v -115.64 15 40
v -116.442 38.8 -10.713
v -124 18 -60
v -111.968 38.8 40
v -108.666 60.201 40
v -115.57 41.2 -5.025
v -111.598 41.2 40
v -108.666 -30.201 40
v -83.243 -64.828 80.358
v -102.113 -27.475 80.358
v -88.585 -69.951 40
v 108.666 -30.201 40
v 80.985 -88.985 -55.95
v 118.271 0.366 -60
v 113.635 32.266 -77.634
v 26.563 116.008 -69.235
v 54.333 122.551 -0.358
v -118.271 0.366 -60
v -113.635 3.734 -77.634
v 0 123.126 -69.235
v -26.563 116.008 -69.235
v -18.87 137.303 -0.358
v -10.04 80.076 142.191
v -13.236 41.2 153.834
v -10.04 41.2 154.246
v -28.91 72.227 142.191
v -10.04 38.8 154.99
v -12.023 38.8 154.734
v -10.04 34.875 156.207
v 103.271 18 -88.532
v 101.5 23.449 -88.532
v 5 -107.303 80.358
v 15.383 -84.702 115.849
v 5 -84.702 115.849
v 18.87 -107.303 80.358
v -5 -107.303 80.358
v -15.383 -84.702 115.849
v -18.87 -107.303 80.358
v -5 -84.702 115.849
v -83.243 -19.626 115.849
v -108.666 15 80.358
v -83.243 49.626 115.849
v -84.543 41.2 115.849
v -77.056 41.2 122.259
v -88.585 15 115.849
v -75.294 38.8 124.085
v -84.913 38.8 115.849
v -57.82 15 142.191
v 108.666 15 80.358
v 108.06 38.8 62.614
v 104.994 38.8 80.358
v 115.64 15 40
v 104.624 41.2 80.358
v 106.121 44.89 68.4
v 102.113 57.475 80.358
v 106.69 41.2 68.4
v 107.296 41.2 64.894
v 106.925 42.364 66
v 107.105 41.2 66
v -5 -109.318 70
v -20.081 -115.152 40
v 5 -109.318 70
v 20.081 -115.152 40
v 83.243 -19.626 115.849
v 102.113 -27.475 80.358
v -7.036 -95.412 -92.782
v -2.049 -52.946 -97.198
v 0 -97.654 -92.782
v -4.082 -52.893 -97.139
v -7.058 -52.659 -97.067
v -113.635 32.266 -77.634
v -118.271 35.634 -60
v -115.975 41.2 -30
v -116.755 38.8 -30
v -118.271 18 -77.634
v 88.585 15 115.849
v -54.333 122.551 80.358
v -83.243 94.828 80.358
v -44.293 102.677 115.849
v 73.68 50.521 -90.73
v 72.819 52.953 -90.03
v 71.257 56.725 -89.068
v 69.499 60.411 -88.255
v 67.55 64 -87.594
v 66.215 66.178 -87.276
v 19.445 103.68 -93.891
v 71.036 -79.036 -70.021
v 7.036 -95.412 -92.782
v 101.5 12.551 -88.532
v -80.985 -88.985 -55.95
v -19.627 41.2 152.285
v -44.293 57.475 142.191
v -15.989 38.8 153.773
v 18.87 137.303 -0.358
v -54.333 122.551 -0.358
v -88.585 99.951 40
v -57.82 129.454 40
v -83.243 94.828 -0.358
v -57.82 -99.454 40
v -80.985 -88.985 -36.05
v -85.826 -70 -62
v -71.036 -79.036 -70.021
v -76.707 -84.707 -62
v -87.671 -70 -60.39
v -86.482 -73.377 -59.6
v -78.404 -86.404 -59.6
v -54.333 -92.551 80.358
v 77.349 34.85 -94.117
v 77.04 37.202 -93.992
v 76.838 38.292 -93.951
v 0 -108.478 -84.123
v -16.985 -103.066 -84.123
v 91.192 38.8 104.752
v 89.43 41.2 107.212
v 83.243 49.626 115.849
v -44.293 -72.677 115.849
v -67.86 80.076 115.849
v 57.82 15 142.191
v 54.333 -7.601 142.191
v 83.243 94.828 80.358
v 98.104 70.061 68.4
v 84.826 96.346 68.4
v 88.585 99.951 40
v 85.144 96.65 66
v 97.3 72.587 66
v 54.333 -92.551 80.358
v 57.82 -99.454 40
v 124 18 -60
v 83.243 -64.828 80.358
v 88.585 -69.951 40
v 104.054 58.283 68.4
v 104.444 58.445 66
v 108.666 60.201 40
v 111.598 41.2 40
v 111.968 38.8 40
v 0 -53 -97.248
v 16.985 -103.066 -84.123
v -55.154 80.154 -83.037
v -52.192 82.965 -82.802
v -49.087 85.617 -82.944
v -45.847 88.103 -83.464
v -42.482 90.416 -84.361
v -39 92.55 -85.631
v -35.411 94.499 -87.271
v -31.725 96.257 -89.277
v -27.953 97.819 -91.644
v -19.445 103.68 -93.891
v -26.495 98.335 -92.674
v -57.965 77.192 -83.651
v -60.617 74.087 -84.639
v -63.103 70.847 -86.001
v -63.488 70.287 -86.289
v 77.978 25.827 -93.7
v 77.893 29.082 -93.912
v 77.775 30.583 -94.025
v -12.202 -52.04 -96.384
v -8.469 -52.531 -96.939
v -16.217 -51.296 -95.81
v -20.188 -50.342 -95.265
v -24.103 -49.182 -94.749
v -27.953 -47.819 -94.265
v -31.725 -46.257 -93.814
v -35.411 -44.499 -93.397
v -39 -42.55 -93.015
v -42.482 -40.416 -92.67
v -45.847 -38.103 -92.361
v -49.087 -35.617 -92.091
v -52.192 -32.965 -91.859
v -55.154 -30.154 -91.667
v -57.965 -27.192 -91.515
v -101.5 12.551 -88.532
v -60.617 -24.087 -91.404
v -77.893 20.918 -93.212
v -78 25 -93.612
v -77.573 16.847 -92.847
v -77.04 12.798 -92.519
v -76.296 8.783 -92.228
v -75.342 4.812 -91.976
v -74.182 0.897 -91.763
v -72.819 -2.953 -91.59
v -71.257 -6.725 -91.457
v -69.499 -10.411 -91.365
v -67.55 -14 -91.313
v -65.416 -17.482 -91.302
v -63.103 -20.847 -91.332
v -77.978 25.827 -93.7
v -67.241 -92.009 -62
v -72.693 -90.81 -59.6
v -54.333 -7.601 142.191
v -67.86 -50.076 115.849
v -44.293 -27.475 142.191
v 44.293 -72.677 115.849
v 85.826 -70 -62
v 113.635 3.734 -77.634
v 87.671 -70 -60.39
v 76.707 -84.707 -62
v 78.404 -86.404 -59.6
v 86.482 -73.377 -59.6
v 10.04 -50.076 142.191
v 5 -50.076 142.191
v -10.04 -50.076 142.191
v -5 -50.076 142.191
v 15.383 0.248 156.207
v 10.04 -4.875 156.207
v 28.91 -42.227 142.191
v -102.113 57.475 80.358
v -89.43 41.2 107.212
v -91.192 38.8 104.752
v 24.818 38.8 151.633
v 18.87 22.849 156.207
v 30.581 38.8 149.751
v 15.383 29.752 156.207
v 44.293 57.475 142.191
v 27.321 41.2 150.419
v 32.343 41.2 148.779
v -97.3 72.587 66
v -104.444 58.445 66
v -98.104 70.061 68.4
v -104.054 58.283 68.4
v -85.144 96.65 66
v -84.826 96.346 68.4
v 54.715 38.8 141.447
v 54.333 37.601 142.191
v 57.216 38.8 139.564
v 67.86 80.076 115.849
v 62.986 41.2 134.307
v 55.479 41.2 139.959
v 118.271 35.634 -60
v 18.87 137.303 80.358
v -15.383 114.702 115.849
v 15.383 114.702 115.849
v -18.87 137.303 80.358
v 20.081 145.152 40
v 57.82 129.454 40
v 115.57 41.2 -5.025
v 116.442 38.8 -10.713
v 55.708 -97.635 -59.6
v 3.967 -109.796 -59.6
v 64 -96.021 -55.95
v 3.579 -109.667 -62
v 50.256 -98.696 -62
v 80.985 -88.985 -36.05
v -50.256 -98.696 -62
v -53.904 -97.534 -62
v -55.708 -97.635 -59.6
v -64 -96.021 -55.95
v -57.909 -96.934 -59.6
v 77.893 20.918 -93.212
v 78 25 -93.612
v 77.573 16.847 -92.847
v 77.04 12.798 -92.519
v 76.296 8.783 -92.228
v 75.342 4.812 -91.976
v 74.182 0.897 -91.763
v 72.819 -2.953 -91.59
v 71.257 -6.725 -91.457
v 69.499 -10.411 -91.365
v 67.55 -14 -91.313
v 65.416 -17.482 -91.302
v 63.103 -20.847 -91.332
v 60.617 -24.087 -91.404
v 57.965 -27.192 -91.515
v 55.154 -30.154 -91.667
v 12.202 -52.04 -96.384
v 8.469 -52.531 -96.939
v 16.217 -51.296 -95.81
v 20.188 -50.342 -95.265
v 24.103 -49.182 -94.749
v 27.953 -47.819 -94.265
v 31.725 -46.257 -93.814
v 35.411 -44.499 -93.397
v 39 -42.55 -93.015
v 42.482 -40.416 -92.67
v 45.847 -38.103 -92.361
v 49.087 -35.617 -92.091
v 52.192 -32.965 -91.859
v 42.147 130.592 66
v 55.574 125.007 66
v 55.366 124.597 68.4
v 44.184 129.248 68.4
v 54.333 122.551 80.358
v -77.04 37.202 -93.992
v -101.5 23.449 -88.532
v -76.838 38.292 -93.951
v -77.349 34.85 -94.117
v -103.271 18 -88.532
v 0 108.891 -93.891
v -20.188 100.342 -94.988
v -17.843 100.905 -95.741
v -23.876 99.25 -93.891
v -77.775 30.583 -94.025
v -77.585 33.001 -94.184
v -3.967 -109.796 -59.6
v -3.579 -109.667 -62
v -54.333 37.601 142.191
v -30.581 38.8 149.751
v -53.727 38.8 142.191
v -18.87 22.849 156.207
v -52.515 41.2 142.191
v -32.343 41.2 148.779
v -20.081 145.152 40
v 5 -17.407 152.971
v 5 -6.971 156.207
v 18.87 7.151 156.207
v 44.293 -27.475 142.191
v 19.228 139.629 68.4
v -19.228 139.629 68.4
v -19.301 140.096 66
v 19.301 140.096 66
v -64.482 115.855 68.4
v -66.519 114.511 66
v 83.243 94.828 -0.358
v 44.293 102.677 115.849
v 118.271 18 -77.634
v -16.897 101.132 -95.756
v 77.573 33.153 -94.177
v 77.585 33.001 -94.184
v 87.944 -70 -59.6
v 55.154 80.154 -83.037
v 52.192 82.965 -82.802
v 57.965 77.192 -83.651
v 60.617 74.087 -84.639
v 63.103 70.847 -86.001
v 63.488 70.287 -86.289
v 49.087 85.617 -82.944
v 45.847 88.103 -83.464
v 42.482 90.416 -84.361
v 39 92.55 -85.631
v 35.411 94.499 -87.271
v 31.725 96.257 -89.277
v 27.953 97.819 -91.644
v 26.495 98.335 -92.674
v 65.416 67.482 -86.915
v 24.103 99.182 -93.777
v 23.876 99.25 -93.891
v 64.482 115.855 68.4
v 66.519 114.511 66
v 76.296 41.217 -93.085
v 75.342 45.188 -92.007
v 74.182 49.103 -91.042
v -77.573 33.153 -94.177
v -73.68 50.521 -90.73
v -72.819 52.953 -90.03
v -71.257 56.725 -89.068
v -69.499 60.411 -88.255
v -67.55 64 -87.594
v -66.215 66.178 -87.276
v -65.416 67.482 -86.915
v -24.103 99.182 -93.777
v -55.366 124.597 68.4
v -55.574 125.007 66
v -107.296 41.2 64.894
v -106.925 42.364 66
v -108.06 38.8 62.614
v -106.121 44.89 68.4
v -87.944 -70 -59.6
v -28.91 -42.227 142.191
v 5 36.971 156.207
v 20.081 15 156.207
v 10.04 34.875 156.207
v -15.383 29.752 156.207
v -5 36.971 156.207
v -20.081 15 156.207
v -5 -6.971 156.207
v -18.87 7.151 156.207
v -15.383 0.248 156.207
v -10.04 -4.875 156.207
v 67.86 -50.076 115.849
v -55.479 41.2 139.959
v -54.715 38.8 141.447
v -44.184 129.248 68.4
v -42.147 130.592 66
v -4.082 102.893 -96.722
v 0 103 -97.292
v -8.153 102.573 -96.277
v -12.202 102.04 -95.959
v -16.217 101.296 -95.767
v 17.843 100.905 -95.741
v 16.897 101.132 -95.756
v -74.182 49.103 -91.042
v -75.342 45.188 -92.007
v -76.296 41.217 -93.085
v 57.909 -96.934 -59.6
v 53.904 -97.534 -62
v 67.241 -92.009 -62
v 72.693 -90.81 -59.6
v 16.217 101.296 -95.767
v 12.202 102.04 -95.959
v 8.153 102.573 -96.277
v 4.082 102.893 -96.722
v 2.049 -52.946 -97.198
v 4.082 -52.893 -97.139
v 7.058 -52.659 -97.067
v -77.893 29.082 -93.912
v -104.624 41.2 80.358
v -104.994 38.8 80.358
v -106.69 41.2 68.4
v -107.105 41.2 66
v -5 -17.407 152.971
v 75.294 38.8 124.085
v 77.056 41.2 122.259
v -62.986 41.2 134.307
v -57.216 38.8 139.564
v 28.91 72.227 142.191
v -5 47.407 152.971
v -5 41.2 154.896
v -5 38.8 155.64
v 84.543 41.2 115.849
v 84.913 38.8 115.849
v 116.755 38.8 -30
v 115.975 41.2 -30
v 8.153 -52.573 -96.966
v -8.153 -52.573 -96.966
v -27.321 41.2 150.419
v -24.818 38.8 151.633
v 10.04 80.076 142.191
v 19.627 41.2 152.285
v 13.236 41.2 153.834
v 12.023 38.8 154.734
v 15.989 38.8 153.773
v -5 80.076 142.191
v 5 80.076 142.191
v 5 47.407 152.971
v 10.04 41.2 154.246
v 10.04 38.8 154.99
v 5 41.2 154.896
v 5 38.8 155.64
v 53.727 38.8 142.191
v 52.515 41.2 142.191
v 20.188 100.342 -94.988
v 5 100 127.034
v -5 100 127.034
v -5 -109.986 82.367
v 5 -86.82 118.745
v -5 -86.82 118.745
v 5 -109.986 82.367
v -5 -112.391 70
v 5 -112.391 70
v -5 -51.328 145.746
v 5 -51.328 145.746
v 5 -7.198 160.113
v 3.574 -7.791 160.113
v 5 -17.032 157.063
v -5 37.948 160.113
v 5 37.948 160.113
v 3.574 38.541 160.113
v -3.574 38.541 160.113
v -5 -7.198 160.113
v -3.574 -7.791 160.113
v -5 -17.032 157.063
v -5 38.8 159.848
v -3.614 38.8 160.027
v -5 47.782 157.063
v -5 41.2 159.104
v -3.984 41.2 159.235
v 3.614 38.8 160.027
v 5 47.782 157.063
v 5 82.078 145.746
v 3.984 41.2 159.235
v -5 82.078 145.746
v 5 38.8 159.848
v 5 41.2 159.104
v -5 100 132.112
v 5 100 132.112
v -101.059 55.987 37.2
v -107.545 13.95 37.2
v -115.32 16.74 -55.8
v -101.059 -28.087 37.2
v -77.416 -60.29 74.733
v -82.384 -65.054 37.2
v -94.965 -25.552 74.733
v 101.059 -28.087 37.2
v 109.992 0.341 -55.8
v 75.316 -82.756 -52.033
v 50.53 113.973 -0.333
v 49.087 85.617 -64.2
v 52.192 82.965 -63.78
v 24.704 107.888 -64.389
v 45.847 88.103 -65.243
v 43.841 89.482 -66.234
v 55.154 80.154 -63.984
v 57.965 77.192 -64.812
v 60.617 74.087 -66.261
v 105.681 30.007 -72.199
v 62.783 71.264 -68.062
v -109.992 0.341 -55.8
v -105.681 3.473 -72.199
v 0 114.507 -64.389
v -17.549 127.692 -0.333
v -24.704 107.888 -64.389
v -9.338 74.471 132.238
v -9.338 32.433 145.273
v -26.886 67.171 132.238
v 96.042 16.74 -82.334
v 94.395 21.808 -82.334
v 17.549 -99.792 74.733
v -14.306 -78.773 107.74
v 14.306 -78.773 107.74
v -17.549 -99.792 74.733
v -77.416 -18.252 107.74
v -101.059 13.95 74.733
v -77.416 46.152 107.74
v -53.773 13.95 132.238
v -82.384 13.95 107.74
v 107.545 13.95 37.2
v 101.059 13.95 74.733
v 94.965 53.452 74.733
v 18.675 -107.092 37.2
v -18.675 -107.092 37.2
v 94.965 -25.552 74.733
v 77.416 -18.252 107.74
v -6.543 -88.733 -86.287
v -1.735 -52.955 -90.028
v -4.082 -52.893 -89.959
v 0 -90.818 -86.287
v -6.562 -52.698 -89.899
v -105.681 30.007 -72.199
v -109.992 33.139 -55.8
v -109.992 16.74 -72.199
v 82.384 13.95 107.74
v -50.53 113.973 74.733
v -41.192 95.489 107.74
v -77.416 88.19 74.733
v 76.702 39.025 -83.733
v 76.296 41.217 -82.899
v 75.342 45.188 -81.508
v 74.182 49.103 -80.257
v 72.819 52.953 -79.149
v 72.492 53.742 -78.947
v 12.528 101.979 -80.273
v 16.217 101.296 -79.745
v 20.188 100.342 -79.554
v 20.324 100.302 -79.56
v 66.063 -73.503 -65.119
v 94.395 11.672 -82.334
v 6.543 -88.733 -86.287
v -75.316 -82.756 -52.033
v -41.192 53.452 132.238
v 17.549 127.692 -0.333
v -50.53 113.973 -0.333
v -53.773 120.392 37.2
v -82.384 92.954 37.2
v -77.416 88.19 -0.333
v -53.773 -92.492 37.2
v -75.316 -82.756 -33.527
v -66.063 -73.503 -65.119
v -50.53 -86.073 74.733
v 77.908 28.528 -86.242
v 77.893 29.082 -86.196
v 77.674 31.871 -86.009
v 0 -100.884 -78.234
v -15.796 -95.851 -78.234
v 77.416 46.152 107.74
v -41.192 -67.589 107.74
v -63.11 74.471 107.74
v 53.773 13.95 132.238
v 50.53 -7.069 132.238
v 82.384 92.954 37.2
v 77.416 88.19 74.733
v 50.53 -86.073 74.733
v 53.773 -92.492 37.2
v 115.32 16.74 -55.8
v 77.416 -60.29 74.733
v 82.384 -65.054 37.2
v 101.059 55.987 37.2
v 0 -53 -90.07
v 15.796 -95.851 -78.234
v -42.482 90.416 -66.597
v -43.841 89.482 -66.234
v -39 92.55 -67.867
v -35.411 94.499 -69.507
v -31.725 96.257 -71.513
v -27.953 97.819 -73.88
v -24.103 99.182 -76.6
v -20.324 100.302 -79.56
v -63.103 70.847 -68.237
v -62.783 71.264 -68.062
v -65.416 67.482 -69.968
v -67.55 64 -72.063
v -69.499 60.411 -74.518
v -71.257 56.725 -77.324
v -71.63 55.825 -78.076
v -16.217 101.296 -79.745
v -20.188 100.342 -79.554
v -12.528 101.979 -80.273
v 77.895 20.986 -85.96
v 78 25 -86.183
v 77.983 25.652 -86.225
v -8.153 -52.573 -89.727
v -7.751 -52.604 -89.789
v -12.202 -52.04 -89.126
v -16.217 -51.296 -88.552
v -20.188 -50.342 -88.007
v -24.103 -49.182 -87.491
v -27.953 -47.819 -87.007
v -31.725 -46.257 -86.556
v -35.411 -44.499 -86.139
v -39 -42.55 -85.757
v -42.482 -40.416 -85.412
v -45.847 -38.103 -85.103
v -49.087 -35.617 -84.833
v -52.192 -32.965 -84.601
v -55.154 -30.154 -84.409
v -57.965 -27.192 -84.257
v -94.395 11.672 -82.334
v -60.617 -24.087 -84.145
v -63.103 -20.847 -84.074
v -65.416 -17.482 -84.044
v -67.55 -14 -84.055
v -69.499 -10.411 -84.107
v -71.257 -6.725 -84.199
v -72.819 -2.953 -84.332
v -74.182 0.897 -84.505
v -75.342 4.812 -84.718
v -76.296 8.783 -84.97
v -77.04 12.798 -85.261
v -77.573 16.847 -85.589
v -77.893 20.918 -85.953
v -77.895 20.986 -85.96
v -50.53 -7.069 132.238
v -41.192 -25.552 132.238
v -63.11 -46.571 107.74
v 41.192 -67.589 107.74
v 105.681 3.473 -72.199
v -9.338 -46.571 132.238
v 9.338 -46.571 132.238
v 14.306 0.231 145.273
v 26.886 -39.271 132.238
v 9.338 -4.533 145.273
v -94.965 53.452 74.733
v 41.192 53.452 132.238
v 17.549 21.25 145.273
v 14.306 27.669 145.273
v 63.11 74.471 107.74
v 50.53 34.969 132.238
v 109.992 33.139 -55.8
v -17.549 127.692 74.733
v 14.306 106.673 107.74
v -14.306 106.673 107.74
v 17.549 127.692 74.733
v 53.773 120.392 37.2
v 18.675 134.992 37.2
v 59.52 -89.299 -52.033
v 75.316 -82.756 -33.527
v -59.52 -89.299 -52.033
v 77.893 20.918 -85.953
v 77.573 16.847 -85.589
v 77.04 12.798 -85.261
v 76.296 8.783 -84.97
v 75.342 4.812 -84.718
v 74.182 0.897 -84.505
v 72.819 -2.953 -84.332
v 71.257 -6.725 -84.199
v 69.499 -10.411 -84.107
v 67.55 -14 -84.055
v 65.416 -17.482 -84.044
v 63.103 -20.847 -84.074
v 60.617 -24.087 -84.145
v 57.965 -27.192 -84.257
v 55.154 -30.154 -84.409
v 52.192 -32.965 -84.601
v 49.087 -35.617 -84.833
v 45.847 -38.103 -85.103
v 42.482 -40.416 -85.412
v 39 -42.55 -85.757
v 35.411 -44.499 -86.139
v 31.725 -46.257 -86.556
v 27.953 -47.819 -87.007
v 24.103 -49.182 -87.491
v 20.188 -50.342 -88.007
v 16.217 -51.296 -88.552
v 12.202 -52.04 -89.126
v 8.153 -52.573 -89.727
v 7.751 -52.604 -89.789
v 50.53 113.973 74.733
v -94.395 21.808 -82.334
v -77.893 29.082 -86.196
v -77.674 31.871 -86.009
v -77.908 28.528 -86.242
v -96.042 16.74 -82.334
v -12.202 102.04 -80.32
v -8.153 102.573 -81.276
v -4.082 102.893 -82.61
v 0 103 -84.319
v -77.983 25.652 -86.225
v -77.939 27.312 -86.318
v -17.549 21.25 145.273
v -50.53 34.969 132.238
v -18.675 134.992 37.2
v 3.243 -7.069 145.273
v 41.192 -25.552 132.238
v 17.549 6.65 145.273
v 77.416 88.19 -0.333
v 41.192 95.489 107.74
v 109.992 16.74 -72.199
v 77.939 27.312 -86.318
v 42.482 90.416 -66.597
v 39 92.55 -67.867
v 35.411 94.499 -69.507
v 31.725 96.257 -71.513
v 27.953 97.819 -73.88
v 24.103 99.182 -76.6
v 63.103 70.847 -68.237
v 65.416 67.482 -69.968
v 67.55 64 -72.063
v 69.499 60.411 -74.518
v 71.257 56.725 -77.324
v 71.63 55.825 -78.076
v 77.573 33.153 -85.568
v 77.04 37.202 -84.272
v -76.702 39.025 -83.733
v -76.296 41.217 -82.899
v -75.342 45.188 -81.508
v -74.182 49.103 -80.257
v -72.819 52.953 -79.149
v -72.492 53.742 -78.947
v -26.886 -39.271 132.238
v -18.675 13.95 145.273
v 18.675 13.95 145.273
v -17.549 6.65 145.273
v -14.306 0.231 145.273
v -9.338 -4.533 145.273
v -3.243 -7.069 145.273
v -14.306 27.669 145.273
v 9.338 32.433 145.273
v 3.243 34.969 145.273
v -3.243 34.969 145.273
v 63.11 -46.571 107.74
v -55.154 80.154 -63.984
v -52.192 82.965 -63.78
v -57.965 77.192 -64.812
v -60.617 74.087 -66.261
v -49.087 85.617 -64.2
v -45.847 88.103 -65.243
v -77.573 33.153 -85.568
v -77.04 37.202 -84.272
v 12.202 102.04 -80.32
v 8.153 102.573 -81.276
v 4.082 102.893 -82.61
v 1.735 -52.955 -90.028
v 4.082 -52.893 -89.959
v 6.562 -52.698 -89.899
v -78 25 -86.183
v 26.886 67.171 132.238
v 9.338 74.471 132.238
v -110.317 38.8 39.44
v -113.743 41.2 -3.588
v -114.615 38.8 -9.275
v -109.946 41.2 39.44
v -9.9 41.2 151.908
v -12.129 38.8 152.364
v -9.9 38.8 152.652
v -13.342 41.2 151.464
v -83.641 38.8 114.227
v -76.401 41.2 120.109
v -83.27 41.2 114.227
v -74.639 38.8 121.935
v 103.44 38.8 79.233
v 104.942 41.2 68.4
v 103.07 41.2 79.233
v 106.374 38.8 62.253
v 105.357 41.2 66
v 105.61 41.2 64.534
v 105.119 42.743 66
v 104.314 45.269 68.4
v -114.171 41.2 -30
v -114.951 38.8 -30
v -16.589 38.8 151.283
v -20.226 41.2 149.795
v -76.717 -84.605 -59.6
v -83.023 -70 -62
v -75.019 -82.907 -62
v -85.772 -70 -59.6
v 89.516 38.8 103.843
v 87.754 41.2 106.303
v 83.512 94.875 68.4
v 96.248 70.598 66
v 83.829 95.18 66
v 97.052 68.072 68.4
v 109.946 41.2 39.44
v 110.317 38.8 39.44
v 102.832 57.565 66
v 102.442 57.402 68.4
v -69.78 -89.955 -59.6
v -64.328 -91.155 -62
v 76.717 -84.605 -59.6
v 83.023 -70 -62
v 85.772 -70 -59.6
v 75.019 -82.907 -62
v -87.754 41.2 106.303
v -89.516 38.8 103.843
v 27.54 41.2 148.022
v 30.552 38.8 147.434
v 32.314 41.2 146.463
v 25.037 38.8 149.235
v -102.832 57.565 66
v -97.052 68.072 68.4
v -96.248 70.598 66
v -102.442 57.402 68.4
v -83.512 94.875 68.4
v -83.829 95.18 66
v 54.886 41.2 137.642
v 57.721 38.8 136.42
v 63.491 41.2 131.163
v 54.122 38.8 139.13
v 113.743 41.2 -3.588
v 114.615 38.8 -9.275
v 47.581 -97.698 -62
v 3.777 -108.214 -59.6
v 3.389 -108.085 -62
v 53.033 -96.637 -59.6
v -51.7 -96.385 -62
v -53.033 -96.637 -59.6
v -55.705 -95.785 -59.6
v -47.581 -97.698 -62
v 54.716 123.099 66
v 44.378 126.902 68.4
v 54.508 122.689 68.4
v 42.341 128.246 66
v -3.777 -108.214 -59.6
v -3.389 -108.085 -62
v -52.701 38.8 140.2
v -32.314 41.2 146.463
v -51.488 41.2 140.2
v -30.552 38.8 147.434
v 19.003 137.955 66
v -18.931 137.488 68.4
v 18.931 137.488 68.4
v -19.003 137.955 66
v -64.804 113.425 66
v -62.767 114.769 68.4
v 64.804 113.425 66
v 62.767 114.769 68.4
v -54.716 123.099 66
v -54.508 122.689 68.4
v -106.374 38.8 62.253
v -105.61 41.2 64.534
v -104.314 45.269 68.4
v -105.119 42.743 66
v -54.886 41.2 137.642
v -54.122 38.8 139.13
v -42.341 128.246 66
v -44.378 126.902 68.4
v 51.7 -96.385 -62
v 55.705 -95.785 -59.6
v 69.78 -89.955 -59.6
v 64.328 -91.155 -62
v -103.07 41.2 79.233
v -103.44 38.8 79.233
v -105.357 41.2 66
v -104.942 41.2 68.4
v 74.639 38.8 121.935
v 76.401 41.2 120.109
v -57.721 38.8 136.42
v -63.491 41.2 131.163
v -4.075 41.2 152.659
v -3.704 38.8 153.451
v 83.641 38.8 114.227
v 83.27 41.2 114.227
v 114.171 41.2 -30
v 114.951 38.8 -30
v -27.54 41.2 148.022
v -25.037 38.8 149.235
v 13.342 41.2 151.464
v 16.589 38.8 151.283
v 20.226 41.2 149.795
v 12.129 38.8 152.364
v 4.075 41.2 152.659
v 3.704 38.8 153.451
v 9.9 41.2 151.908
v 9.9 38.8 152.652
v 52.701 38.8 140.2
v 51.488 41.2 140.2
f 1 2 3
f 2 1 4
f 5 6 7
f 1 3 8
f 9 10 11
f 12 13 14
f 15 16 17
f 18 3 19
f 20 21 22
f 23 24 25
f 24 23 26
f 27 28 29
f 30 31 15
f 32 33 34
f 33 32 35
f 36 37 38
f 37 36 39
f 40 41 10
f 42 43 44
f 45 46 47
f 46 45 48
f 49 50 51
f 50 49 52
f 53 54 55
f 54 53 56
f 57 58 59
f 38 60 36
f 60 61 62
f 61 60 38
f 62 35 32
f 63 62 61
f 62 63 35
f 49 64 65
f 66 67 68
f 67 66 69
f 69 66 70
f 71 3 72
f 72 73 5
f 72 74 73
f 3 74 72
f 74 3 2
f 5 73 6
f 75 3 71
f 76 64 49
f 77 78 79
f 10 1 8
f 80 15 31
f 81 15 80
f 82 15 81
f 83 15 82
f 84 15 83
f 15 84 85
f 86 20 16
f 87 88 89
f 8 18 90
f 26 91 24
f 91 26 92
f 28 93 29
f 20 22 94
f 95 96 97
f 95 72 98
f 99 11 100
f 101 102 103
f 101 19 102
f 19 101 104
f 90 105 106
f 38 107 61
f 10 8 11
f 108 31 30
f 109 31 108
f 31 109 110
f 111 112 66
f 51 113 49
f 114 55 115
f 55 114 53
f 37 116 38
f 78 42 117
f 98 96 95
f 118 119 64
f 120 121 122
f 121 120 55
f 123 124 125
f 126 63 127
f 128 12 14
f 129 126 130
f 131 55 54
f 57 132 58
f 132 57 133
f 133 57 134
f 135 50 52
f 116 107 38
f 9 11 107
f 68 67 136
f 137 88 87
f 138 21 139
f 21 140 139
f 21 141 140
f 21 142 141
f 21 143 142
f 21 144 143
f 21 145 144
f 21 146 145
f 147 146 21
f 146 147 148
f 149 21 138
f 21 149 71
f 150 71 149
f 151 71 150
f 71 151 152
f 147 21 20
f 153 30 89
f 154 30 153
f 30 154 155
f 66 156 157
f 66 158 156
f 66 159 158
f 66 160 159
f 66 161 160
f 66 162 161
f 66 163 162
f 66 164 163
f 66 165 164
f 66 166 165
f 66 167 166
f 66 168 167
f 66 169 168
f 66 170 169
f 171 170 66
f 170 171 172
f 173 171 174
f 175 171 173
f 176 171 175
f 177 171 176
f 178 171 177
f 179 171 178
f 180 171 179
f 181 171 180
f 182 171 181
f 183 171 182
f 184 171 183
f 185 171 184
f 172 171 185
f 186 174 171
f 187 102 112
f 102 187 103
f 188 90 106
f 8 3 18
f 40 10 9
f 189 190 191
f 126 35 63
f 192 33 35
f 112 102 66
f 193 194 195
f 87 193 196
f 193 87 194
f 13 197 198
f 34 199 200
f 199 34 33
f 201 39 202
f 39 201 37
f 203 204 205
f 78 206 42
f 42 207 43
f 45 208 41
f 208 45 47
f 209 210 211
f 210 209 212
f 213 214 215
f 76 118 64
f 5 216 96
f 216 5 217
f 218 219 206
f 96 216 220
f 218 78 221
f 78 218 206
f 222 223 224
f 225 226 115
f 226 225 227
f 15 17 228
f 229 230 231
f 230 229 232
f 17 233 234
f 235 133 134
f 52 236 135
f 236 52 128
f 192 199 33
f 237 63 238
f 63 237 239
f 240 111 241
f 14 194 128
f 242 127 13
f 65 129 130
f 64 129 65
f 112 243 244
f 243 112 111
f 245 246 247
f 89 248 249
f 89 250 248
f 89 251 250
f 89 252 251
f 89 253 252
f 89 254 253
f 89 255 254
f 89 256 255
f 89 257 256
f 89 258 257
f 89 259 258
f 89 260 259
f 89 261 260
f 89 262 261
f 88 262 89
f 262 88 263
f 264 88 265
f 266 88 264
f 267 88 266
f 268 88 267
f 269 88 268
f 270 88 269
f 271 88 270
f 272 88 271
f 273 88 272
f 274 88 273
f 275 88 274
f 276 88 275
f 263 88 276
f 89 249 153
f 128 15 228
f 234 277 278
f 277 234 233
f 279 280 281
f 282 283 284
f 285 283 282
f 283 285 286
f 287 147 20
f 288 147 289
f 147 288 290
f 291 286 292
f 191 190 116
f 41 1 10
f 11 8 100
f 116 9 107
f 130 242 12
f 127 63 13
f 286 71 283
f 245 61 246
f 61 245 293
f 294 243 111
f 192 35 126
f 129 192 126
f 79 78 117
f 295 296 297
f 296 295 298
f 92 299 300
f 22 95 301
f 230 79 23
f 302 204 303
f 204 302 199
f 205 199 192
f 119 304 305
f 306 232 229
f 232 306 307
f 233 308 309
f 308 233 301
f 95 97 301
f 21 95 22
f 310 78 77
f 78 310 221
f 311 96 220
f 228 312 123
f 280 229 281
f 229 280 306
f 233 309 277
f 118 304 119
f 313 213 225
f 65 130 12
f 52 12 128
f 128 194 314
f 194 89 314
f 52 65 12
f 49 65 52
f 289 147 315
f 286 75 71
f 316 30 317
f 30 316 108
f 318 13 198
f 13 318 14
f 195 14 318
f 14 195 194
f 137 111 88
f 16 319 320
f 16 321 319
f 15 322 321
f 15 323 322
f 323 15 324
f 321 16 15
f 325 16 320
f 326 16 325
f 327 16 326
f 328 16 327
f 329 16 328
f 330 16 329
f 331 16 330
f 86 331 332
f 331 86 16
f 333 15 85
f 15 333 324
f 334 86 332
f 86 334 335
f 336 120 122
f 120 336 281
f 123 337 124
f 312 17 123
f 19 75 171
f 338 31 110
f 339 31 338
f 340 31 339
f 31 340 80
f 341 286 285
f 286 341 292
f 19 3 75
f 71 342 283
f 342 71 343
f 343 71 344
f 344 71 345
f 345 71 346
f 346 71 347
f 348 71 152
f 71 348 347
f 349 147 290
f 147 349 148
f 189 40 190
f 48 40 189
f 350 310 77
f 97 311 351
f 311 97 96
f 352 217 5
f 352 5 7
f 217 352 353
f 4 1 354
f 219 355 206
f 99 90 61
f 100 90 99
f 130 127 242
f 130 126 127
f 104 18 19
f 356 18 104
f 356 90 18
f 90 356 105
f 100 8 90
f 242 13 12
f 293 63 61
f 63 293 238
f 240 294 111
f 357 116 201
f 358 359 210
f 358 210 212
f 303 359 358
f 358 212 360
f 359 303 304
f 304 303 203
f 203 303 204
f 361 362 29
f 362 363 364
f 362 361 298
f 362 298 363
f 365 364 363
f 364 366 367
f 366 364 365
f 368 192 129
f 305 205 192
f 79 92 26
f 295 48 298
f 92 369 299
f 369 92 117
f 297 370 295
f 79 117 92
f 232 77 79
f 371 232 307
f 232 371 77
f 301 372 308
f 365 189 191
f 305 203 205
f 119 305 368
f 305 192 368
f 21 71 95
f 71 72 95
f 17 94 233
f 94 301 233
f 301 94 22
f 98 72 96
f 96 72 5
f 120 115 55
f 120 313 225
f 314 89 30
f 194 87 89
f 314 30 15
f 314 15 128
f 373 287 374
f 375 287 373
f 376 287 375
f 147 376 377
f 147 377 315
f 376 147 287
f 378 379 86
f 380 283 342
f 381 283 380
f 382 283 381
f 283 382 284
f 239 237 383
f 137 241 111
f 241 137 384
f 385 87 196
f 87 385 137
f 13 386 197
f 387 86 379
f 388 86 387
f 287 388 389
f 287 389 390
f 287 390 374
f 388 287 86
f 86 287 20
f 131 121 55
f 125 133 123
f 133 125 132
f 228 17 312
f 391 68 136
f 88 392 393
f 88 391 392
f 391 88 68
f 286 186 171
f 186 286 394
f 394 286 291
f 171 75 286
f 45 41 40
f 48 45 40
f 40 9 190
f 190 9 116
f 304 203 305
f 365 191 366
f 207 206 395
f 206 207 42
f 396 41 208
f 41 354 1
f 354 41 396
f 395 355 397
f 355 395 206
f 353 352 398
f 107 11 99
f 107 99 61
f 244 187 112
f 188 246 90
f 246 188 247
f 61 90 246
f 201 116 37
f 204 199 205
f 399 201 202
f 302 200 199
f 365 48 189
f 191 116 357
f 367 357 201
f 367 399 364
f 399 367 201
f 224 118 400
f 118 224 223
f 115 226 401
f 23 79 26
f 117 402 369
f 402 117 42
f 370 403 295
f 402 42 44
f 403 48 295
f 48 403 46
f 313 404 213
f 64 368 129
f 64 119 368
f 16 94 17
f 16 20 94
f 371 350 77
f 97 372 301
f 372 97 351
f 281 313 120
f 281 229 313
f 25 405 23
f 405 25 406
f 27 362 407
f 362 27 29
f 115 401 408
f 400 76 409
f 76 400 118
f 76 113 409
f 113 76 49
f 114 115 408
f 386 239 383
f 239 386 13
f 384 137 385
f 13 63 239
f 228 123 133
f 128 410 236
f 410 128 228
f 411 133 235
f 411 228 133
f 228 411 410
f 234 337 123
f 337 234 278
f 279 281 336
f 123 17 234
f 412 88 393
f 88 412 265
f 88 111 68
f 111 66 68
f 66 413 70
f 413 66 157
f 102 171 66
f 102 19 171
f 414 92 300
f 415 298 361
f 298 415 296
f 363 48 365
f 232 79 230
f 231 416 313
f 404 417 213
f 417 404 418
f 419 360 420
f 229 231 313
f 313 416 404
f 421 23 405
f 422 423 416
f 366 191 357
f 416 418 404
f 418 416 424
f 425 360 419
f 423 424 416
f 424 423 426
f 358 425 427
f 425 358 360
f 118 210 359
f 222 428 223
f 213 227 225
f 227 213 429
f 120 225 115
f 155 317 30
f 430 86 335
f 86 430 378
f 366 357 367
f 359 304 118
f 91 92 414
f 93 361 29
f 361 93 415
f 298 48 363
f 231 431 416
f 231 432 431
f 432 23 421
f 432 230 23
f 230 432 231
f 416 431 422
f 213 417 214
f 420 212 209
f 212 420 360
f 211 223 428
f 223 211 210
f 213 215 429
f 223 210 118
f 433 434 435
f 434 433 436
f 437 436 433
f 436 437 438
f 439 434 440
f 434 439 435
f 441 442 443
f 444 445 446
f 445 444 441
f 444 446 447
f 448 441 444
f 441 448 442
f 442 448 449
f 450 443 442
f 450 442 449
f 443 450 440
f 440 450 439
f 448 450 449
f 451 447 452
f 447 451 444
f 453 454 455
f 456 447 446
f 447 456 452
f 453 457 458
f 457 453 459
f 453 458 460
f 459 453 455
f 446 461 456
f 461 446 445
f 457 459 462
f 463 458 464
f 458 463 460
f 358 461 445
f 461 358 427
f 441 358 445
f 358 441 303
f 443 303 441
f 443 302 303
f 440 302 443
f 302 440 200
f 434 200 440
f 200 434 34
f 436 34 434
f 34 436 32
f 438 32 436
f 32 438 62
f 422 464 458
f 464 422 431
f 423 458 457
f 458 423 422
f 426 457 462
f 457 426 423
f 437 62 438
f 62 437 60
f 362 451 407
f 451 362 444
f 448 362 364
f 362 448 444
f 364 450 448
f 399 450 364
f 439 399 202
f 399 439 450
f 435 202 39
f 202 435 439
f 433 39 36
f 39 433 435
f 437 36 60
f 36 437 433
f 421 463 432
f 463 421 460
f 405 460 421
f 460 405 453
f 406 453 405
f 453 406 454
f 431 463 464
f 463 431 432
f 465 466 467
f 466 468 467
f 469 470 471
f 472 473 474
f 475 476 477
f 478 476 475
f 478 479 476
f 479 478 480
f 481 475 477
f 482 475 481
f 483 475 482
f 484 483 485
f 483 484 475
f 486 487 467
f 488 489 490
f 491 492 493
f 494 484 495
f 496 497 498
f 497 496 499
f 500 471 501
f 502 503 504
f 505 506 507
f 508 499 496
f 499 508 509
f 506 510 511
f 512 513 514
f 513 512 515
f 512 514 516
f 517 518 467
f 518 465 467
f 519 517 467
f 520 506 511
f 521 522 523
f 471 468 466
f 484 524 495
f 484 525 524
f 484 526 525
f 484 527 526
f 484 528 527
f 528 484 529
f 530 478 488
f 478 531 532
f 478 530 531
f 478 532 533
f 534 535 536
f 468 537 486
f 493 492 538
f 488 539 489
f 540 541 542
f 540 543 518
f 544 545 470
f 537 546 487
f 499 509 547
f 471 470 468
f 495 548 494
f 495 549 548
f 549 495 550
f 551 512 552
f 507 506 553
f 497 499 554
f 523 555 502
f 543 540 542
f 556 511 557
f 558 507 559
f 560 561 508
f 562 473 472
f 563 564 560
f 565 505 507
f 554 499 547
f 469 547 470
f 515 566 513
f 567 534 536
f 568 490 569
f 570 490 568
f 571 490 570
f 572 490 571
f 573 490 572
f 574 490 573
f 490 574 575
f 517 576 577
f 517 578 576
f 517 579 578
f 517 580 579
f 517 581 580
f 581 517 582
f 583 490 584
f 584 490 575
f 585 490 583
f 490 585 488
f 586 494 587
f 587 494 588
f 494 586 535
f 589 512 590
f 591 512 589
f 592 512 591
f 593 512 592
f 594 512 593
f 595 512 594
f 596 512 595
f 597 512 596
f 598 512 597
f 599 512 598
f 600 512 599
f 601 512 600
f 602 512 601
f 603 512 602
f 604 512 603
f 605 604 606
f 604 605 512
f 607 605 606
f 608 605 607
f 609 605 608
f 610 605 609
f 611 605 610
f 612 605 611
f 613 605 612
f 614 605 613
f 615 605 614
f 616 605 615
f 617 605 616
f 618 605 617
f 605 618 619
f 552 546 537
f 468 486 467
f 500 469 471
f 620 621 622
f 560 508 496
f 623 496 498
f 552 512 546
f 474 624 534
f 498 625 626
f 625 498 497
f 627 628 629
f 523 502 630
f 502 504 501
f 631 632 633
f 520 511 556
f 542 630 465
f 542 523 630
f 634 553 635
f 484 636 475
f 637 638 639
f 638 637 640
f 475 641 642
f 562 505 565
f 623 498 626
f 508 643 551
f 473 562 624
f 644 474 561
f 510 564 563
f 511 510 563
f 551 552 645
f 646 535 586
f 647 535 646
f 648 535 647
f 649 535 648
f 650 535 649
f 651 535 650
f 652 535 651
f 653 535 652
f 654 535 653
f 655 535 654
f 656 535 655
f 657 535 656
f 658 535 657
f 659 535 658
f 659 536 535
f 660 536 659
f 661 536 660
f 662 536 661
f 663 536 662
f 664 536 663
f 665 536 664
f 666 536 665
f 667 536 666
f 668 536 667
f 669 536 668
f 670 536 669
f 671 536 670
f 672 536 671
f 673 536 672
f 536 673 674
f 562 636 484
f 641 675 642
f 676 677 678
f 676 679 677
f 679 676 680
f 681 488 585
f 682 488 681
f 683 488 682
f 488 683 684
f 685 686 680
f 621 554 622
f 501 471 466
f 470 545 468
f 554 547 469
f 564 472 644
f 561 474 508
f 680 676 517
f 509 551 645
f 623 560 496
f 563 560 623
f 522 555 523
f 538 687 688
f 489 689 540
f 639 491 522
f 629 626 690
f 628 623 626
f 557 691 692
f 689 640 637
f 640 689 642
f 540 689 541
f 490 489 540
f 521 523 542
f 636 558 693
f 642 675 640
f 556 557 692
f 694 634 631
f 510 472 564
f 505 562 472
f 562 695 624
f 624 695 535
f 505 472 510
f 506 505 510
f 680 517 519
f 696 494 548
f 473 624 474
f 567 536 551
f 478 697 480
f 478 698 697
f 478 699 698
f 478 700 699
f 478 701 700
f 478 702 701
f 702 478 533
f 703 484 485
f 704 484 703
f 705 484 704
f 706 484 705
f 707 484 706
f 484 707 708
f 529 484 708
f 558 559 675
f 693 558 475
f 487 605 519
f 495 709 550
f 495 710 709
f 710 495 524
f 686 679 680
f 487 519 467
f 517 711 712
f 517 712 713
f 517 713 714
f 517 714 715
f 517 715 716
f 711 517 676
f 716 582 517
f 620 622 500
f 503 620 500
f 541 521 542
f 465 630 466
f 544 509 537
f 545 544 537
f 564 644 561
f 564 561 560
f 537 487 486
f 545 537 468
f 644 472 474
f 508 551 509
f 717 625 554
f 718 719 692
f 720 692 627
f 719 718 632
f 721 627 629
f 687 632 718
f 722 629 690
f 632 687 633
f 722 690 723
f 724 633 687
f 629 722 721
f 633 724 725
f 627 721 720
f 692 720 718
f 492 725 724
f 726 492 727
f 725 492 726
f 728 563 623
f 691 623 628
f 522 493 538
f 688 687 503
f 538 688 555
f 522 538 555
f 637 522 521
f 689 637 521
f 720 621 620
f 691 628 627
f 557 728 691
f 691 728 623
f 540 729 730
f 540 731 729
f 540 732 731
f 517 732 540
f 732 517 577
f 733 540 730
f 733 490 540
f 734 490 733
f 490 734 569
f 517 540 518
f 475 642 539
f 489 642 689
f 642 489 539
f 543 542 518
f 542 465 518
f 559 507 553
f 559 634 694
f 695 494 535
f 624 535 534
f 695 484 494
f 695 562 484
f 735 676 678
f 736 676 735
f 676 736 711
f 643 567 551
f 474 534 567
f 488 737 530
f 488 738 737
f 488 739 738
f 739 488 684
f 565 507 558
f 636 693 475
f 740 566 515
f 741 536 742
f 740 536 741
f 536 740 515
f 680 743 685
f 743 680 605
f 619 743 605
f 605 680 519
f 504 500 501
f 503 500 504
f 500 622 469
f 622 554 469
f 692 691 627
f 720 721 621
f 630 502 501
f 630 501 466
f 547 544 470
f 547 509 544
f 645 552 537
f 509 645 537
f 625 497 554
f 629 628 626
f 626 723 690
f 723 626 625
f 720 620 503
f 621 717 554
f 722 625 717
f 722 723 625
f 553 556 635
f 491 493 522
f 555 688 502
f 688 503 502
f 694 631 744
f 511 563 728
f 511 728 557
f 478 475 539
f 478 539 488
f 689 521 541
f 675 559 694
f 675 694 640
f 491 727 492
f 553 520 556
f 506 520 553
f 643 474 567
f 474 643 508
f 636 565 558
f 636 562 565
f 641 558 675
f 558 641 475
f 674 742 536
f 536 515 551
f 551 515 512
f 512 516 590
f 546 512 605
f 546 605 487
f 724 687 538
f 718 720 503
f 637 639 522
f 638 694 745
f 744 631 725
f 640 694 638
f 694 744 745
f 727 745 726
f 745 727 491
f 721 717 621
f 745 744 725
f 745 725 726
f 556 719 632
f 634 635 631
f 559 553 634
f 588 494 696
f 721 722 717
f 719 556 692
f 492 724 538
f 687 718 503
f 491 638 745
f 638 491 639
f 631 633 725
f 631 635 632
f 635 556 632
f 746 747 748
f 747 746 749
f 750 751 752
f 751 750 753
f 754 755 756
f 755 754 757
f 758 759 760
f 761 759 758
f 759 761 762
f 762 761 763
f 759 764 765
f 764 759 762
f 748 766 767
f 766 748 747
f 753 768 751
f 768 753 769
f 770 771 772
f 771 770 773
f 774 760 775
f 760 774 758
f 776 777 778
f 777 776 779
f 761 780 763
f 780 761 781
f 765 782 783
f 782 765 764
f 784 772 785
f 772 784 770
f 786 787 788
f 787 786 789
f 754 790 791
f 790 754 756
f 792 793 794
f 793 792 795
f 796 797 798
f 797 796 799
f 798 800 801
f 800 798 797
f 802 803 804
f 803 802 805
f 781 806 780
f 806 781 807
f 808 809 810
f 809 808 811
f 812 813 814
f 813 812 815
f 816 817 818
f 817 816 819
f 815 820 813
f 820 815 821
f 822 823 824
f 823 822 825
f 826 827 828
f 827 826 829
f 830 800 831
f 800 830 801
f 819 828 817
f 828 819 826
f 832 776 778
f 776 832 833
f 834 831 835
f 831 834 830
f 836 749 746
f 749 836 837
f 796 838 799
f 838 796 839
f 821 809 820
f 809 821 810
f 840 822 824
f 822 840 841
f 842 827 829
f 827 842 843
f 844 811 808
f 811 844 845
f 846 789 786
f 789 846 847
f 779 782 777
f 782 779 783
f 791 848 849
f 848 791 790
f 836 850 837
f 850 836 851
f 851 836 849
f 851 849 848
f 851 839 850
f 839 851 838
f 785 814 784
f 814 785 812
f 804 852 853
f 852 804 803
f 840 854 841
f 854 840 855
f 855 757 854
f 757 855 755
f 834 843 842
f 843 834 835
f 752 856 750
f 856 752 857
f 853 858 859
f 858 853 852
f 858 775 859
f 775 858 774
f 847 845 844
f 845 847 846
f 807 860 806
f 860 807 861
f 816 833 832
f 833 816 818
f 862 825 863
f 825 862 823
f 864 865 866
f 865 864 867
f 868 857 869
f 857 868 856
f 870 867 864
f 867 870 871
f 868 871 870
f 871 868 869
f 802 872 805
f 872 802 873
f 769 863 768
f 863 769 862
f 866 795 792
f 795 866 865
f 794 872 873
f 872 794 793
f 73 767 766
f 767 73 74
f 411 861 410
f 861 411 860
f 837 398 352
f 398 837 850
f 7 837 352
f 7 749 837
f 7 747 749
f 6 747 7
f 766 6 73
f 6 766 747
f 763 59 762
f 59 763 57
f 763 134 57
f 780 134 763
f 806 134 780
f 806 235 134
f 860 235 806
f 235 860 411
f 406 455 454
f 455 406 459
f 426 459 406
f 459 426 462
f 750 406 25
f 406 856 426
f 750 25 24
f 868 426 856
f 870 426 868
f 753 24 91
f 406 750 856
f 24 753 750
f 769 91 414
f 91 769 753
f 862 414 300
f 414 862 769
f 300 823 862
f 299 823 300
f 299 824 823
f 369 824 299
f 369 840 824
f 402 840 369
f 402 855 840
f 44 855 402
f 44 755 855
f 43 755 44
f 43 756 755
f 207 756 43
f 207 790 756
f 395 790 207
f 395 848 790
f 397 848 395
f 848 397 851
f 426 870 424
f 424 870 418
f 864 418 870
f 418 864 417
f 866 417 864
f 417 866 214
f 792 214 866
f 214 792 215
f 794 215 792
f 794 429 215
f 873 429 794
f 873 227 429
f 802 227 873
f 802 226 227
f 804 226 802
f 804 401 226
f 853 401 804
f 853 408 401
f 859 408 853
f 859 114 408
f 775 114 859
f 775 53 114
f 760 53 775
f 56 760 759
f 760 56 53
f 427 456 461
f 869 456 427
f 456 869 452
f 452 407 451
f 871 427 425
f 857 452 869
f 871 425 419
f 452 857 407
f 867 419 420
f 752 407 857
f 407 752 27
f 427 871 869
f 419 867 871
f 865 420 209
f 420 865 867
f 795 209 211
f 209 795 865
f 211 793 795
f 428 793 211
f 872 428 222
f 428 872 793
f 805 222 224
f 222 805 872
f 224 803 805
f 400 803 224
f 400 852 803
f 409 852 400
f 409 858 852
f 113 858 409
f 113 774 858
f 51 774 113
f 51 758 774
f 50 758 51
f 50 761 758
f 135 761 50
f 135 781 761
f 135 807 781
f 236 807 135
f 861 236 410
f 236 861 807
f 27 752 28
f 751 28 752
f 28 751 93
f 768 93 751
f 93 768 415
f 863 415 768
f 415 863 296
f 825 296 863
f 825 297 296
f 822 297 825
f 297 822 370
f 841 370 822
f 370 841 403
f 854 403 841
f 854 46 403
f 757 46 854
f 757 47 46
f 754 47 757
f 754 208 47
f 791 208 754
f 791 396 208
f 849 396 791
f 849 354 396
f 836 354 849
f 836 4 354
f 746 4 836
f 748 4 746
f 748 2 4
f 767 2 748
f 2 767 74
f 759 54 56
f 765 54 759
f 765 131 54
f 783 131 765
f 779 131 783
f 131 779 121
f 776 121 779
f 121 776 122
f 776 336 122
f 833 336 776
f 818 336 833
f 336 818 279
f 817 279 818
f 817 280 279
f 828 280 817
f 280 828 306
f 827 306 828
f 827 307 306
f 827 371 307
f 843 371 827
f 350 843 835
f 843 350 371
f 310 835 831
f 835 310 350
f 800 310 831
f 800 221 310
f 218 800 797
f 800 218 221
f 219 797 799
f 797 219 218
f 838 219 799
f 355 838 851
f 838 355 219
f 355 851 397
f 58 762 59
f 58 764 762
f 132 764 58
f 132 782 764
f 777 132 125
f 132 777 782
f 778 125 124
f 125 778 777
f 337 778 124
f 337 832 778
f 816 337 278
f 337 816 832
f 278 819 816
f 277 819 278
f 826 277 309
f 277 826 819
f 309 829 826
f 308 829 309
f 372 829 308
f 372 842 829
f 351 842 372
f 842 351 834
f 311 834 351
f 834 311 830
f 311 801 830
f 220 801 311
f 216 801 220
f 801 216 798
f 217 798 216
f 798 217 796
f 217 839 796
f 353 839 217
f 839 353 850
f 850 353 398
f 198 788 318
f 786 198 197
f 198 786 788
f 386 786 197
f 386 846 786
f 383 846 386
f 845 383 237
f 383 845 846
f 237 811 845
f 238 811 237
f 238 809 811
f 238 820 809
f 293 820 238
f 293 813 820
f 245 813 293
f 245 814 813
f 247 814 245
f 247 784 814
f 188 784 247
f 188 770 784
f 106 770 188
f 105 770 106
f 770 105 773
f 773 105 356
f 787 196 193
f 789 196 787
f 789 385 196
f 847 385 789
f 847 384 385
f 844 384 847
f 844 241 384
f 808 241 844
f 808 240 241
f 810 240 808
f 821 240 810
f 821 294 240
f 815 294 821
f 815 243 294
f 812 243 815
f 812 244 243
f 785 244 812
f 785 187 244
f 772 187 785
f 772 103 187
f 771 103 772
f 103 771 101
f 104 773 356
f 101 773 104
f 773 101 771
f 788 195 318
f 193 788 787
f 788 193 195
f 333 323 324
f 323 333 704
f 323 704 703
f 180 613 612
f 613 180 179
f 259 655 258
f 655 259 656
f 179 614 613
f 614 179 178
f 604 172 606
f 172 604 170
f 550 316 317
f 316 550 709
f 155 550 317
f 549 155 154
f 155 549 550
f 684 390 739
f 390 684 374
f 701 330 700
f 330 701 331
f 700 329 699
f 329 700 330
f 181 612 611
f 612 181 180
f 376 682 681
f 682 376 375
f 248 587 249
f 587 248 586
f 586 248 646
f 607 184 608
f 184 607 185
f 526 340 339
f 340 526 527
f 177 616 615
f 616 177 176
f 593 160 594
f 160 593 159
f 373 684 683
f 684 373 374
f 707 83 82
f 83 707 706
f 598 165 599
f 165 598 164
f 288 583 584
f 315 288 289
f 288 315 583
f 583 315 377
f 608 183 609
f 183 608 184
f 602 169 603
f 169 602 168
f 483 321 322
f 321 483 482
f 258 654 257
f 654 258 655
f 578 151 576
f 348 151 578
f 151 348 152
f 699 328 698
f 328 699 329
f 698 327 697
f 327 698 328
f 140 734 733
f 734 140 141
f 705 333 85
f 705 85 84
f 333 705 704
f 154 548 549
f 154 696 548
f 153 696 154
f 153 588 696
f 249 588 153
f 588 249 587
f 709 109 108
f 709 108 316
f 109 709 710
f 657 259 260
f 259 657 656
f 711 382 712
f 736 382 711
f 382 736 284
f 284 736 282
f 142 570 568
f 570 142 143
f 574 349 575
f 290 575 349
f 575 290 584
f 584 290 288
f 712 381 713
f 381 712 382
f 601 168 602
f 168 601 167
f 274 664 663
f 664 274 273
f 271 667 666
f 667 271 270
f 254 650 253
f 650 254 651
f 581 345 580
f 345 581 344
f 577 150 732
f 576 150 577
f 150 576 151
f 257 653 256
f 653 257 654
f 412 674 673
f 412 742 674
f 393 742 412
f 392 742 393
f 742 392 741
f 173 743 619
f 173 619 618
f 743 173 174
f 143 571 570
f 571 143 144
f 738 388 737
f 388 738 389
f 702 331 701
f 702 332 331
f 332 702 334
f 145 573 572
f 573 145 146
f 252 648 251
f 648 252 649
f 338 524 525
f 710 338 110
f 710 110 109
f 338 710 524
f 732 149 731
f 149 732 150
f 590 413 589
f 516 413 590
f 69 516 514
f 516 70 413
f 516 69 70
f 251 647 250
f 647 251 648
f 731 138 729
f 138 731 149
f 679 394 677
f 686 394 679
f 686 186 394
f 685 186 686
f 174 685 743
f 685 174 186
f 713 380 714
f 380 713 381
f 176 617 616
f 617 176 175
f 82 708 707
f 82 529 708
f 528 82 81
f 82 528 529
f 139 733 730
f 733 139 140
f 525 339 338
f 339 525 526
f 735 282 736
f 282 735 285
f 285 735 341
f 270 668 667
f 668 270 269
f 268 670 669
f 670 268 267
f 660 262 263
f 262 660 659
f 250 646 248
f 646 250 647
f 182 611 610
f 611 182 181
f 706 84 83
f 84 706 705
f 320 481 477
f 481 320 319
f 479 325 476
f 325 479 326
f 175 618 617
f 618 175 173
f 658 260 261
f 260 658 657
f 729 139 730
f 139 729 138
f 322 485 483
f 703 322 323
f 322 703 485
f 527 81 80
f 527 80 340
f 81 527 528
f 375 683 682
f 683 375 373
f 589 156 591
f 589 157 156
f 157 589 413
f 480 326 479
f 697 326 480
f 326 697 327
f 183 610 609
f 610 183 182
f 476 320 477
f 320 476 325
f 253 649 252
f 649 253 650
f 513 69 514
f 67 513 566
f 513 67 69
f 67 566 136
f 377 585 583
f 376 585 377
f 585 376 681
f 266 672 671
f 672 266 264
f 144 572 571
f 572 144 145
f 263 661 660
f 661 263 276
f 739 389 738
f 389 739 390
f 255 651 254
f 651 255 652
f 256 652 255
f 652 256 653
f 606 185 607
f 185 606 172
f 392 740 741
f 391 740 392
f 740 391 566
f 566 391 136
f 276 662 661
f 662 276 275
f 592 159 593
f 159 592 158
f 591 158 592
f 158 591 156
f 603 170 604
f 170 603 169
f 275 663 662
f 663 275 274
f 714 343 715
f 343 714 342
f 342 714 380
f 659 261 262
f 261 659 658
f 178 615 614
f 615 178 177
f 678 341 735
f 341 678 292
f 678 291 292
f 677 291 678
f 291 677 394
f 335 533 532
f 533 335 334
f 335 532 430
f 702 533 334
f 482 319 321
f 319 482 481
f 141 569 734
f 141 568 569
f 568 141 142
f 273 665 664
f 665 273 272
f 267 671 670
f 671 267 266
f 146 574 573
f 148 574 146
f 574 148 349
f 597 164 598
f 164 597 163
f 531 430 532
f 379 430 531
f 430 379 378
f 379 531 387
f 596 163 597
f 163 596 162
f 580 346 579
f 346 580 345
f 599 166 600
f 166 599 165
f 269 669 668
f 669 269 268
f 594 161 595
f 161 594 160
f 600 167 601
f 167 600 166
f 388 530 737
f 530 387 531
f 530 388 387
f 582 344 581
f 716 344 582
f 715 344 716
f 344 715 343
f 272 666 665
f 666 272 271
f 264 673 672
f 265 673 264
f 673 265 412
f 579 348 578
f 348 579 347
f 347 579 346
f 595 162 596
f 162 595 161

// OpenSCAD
// Casque futuriste original à yeux animés (2 écrans ronds 1,85")
// Maquette de style — pièces séparées pour le rendu (part = ...)
part = "coque";
$fn = 120;

module crane(){ translate([0,15,40]) scale([0.98,1.12,1.0]) sphere(r=118, $fn=18); }
module corps(){
  hull(){
    crane();
    translate([0,-90,-78]) scale([1.3,1,0.8]) sphere(r=20, $fn=8);           // menton
    for(s=[-1,1]) translate([s*64,-72,-46]) sphere(r=26, $fn=8);             // pommettes
    for(s=[-1,1]) translate([s*94,18,-60]) sphere(r=30, $fn=10);              // mâchoire arrière
    translate([0,70,-55]) sphere(r=55, $fn=12);                               // nuque
  }
}
module corps_coupe(){ difference(){ corps(); translate([0,0,-300]) cube(400,center=true); } } // bas coupé à z=-100
module couche(e){ difference(){ scale(1+e) corps_coupe(); corps_coupe(); } }  // fine peau extérieure

module visiere_poly(){ polygon([[-100,40],[-70,52],[-14,44],[0,36],[14,44],[70,52],[100,40],[96,22],[62,-6],[24,-6],[0,-26],[-24,-6],[-62,-6],[-96,22]]); }
module prisme(){ rotate([90,0,0]) linear_extrude(320) children(); }            // extrusion vers l'avant (-y)

module rainure(slab){ intersection(){ children(); difference(){ cube(800,center=true); scale(0.986) corps_coupe(); } } }

if (part=="coque") difference(){
  union(){
    corps_coupe();
    // crête centrale
    intersection(){ scale(1.025) corps_coupe(); translate([-5,-130,70]) cube([10,230,200]); }
  }
  scale(0.93) corps_coupe();                                       // creux intérieur
  translate([0,25,-180]) cylinder(r=78, h=140);                    // ouverture du cou
  rainure() translate([-400,38.8,-30]) cube([800,2.4,400]);        // rainure verticale (côtés + dessus)
  rainure() translate([-400,40,66]) cube([800,400,2.4]);           // rainure arrière horizontale
  rainure() translate([-400,-400,-62]) cube([800,330,2.4]);        // rainure basse du masque
}
if (part=="visiere") intersection(){ couche(0.013); prisme() visiere_poly(); }
if (part=="liseres") intersection(){ couche(0.016); prisme() difference(){ offset(delta=7) visiere_poly(); offset(delta=3) visiere_poly(); } }
if (part=="lumieres") intersection(){ couche(0.015); prisme() union(){
    for(s=[-1,1]) scale([s,1]) polygon([[44,-36],[82,-14],[84,-19],[46,-42]]);     // traits de joues
    for(x=[-12,0,12]) translate([x-2.2,-70]) square([4.4,26]);                     // fentes du menton
} }
if (part=="oreilles") for(s=[-1,1]) translate([s*113,22,2]) rotate([0,s*90,0]) difference(){
  cylinder(d=84, h=16); translate([0,0,10]) cylinder(d=56, h=10);
}
if (part=="anneaux") for(s=[-1,1]) translate([s*(113+10.2),22,2]) rotate([0,s*90,0]) difference(){ cylinder(d=50,h=1.5); cylinder(d=42,h=5,center=true); }
if (part=="socle") { translate([0,25,-262]) cylinder(r=46, h=175); translate([0,25,-290]) cylinder(r1=120, r2=108, h=28); }
